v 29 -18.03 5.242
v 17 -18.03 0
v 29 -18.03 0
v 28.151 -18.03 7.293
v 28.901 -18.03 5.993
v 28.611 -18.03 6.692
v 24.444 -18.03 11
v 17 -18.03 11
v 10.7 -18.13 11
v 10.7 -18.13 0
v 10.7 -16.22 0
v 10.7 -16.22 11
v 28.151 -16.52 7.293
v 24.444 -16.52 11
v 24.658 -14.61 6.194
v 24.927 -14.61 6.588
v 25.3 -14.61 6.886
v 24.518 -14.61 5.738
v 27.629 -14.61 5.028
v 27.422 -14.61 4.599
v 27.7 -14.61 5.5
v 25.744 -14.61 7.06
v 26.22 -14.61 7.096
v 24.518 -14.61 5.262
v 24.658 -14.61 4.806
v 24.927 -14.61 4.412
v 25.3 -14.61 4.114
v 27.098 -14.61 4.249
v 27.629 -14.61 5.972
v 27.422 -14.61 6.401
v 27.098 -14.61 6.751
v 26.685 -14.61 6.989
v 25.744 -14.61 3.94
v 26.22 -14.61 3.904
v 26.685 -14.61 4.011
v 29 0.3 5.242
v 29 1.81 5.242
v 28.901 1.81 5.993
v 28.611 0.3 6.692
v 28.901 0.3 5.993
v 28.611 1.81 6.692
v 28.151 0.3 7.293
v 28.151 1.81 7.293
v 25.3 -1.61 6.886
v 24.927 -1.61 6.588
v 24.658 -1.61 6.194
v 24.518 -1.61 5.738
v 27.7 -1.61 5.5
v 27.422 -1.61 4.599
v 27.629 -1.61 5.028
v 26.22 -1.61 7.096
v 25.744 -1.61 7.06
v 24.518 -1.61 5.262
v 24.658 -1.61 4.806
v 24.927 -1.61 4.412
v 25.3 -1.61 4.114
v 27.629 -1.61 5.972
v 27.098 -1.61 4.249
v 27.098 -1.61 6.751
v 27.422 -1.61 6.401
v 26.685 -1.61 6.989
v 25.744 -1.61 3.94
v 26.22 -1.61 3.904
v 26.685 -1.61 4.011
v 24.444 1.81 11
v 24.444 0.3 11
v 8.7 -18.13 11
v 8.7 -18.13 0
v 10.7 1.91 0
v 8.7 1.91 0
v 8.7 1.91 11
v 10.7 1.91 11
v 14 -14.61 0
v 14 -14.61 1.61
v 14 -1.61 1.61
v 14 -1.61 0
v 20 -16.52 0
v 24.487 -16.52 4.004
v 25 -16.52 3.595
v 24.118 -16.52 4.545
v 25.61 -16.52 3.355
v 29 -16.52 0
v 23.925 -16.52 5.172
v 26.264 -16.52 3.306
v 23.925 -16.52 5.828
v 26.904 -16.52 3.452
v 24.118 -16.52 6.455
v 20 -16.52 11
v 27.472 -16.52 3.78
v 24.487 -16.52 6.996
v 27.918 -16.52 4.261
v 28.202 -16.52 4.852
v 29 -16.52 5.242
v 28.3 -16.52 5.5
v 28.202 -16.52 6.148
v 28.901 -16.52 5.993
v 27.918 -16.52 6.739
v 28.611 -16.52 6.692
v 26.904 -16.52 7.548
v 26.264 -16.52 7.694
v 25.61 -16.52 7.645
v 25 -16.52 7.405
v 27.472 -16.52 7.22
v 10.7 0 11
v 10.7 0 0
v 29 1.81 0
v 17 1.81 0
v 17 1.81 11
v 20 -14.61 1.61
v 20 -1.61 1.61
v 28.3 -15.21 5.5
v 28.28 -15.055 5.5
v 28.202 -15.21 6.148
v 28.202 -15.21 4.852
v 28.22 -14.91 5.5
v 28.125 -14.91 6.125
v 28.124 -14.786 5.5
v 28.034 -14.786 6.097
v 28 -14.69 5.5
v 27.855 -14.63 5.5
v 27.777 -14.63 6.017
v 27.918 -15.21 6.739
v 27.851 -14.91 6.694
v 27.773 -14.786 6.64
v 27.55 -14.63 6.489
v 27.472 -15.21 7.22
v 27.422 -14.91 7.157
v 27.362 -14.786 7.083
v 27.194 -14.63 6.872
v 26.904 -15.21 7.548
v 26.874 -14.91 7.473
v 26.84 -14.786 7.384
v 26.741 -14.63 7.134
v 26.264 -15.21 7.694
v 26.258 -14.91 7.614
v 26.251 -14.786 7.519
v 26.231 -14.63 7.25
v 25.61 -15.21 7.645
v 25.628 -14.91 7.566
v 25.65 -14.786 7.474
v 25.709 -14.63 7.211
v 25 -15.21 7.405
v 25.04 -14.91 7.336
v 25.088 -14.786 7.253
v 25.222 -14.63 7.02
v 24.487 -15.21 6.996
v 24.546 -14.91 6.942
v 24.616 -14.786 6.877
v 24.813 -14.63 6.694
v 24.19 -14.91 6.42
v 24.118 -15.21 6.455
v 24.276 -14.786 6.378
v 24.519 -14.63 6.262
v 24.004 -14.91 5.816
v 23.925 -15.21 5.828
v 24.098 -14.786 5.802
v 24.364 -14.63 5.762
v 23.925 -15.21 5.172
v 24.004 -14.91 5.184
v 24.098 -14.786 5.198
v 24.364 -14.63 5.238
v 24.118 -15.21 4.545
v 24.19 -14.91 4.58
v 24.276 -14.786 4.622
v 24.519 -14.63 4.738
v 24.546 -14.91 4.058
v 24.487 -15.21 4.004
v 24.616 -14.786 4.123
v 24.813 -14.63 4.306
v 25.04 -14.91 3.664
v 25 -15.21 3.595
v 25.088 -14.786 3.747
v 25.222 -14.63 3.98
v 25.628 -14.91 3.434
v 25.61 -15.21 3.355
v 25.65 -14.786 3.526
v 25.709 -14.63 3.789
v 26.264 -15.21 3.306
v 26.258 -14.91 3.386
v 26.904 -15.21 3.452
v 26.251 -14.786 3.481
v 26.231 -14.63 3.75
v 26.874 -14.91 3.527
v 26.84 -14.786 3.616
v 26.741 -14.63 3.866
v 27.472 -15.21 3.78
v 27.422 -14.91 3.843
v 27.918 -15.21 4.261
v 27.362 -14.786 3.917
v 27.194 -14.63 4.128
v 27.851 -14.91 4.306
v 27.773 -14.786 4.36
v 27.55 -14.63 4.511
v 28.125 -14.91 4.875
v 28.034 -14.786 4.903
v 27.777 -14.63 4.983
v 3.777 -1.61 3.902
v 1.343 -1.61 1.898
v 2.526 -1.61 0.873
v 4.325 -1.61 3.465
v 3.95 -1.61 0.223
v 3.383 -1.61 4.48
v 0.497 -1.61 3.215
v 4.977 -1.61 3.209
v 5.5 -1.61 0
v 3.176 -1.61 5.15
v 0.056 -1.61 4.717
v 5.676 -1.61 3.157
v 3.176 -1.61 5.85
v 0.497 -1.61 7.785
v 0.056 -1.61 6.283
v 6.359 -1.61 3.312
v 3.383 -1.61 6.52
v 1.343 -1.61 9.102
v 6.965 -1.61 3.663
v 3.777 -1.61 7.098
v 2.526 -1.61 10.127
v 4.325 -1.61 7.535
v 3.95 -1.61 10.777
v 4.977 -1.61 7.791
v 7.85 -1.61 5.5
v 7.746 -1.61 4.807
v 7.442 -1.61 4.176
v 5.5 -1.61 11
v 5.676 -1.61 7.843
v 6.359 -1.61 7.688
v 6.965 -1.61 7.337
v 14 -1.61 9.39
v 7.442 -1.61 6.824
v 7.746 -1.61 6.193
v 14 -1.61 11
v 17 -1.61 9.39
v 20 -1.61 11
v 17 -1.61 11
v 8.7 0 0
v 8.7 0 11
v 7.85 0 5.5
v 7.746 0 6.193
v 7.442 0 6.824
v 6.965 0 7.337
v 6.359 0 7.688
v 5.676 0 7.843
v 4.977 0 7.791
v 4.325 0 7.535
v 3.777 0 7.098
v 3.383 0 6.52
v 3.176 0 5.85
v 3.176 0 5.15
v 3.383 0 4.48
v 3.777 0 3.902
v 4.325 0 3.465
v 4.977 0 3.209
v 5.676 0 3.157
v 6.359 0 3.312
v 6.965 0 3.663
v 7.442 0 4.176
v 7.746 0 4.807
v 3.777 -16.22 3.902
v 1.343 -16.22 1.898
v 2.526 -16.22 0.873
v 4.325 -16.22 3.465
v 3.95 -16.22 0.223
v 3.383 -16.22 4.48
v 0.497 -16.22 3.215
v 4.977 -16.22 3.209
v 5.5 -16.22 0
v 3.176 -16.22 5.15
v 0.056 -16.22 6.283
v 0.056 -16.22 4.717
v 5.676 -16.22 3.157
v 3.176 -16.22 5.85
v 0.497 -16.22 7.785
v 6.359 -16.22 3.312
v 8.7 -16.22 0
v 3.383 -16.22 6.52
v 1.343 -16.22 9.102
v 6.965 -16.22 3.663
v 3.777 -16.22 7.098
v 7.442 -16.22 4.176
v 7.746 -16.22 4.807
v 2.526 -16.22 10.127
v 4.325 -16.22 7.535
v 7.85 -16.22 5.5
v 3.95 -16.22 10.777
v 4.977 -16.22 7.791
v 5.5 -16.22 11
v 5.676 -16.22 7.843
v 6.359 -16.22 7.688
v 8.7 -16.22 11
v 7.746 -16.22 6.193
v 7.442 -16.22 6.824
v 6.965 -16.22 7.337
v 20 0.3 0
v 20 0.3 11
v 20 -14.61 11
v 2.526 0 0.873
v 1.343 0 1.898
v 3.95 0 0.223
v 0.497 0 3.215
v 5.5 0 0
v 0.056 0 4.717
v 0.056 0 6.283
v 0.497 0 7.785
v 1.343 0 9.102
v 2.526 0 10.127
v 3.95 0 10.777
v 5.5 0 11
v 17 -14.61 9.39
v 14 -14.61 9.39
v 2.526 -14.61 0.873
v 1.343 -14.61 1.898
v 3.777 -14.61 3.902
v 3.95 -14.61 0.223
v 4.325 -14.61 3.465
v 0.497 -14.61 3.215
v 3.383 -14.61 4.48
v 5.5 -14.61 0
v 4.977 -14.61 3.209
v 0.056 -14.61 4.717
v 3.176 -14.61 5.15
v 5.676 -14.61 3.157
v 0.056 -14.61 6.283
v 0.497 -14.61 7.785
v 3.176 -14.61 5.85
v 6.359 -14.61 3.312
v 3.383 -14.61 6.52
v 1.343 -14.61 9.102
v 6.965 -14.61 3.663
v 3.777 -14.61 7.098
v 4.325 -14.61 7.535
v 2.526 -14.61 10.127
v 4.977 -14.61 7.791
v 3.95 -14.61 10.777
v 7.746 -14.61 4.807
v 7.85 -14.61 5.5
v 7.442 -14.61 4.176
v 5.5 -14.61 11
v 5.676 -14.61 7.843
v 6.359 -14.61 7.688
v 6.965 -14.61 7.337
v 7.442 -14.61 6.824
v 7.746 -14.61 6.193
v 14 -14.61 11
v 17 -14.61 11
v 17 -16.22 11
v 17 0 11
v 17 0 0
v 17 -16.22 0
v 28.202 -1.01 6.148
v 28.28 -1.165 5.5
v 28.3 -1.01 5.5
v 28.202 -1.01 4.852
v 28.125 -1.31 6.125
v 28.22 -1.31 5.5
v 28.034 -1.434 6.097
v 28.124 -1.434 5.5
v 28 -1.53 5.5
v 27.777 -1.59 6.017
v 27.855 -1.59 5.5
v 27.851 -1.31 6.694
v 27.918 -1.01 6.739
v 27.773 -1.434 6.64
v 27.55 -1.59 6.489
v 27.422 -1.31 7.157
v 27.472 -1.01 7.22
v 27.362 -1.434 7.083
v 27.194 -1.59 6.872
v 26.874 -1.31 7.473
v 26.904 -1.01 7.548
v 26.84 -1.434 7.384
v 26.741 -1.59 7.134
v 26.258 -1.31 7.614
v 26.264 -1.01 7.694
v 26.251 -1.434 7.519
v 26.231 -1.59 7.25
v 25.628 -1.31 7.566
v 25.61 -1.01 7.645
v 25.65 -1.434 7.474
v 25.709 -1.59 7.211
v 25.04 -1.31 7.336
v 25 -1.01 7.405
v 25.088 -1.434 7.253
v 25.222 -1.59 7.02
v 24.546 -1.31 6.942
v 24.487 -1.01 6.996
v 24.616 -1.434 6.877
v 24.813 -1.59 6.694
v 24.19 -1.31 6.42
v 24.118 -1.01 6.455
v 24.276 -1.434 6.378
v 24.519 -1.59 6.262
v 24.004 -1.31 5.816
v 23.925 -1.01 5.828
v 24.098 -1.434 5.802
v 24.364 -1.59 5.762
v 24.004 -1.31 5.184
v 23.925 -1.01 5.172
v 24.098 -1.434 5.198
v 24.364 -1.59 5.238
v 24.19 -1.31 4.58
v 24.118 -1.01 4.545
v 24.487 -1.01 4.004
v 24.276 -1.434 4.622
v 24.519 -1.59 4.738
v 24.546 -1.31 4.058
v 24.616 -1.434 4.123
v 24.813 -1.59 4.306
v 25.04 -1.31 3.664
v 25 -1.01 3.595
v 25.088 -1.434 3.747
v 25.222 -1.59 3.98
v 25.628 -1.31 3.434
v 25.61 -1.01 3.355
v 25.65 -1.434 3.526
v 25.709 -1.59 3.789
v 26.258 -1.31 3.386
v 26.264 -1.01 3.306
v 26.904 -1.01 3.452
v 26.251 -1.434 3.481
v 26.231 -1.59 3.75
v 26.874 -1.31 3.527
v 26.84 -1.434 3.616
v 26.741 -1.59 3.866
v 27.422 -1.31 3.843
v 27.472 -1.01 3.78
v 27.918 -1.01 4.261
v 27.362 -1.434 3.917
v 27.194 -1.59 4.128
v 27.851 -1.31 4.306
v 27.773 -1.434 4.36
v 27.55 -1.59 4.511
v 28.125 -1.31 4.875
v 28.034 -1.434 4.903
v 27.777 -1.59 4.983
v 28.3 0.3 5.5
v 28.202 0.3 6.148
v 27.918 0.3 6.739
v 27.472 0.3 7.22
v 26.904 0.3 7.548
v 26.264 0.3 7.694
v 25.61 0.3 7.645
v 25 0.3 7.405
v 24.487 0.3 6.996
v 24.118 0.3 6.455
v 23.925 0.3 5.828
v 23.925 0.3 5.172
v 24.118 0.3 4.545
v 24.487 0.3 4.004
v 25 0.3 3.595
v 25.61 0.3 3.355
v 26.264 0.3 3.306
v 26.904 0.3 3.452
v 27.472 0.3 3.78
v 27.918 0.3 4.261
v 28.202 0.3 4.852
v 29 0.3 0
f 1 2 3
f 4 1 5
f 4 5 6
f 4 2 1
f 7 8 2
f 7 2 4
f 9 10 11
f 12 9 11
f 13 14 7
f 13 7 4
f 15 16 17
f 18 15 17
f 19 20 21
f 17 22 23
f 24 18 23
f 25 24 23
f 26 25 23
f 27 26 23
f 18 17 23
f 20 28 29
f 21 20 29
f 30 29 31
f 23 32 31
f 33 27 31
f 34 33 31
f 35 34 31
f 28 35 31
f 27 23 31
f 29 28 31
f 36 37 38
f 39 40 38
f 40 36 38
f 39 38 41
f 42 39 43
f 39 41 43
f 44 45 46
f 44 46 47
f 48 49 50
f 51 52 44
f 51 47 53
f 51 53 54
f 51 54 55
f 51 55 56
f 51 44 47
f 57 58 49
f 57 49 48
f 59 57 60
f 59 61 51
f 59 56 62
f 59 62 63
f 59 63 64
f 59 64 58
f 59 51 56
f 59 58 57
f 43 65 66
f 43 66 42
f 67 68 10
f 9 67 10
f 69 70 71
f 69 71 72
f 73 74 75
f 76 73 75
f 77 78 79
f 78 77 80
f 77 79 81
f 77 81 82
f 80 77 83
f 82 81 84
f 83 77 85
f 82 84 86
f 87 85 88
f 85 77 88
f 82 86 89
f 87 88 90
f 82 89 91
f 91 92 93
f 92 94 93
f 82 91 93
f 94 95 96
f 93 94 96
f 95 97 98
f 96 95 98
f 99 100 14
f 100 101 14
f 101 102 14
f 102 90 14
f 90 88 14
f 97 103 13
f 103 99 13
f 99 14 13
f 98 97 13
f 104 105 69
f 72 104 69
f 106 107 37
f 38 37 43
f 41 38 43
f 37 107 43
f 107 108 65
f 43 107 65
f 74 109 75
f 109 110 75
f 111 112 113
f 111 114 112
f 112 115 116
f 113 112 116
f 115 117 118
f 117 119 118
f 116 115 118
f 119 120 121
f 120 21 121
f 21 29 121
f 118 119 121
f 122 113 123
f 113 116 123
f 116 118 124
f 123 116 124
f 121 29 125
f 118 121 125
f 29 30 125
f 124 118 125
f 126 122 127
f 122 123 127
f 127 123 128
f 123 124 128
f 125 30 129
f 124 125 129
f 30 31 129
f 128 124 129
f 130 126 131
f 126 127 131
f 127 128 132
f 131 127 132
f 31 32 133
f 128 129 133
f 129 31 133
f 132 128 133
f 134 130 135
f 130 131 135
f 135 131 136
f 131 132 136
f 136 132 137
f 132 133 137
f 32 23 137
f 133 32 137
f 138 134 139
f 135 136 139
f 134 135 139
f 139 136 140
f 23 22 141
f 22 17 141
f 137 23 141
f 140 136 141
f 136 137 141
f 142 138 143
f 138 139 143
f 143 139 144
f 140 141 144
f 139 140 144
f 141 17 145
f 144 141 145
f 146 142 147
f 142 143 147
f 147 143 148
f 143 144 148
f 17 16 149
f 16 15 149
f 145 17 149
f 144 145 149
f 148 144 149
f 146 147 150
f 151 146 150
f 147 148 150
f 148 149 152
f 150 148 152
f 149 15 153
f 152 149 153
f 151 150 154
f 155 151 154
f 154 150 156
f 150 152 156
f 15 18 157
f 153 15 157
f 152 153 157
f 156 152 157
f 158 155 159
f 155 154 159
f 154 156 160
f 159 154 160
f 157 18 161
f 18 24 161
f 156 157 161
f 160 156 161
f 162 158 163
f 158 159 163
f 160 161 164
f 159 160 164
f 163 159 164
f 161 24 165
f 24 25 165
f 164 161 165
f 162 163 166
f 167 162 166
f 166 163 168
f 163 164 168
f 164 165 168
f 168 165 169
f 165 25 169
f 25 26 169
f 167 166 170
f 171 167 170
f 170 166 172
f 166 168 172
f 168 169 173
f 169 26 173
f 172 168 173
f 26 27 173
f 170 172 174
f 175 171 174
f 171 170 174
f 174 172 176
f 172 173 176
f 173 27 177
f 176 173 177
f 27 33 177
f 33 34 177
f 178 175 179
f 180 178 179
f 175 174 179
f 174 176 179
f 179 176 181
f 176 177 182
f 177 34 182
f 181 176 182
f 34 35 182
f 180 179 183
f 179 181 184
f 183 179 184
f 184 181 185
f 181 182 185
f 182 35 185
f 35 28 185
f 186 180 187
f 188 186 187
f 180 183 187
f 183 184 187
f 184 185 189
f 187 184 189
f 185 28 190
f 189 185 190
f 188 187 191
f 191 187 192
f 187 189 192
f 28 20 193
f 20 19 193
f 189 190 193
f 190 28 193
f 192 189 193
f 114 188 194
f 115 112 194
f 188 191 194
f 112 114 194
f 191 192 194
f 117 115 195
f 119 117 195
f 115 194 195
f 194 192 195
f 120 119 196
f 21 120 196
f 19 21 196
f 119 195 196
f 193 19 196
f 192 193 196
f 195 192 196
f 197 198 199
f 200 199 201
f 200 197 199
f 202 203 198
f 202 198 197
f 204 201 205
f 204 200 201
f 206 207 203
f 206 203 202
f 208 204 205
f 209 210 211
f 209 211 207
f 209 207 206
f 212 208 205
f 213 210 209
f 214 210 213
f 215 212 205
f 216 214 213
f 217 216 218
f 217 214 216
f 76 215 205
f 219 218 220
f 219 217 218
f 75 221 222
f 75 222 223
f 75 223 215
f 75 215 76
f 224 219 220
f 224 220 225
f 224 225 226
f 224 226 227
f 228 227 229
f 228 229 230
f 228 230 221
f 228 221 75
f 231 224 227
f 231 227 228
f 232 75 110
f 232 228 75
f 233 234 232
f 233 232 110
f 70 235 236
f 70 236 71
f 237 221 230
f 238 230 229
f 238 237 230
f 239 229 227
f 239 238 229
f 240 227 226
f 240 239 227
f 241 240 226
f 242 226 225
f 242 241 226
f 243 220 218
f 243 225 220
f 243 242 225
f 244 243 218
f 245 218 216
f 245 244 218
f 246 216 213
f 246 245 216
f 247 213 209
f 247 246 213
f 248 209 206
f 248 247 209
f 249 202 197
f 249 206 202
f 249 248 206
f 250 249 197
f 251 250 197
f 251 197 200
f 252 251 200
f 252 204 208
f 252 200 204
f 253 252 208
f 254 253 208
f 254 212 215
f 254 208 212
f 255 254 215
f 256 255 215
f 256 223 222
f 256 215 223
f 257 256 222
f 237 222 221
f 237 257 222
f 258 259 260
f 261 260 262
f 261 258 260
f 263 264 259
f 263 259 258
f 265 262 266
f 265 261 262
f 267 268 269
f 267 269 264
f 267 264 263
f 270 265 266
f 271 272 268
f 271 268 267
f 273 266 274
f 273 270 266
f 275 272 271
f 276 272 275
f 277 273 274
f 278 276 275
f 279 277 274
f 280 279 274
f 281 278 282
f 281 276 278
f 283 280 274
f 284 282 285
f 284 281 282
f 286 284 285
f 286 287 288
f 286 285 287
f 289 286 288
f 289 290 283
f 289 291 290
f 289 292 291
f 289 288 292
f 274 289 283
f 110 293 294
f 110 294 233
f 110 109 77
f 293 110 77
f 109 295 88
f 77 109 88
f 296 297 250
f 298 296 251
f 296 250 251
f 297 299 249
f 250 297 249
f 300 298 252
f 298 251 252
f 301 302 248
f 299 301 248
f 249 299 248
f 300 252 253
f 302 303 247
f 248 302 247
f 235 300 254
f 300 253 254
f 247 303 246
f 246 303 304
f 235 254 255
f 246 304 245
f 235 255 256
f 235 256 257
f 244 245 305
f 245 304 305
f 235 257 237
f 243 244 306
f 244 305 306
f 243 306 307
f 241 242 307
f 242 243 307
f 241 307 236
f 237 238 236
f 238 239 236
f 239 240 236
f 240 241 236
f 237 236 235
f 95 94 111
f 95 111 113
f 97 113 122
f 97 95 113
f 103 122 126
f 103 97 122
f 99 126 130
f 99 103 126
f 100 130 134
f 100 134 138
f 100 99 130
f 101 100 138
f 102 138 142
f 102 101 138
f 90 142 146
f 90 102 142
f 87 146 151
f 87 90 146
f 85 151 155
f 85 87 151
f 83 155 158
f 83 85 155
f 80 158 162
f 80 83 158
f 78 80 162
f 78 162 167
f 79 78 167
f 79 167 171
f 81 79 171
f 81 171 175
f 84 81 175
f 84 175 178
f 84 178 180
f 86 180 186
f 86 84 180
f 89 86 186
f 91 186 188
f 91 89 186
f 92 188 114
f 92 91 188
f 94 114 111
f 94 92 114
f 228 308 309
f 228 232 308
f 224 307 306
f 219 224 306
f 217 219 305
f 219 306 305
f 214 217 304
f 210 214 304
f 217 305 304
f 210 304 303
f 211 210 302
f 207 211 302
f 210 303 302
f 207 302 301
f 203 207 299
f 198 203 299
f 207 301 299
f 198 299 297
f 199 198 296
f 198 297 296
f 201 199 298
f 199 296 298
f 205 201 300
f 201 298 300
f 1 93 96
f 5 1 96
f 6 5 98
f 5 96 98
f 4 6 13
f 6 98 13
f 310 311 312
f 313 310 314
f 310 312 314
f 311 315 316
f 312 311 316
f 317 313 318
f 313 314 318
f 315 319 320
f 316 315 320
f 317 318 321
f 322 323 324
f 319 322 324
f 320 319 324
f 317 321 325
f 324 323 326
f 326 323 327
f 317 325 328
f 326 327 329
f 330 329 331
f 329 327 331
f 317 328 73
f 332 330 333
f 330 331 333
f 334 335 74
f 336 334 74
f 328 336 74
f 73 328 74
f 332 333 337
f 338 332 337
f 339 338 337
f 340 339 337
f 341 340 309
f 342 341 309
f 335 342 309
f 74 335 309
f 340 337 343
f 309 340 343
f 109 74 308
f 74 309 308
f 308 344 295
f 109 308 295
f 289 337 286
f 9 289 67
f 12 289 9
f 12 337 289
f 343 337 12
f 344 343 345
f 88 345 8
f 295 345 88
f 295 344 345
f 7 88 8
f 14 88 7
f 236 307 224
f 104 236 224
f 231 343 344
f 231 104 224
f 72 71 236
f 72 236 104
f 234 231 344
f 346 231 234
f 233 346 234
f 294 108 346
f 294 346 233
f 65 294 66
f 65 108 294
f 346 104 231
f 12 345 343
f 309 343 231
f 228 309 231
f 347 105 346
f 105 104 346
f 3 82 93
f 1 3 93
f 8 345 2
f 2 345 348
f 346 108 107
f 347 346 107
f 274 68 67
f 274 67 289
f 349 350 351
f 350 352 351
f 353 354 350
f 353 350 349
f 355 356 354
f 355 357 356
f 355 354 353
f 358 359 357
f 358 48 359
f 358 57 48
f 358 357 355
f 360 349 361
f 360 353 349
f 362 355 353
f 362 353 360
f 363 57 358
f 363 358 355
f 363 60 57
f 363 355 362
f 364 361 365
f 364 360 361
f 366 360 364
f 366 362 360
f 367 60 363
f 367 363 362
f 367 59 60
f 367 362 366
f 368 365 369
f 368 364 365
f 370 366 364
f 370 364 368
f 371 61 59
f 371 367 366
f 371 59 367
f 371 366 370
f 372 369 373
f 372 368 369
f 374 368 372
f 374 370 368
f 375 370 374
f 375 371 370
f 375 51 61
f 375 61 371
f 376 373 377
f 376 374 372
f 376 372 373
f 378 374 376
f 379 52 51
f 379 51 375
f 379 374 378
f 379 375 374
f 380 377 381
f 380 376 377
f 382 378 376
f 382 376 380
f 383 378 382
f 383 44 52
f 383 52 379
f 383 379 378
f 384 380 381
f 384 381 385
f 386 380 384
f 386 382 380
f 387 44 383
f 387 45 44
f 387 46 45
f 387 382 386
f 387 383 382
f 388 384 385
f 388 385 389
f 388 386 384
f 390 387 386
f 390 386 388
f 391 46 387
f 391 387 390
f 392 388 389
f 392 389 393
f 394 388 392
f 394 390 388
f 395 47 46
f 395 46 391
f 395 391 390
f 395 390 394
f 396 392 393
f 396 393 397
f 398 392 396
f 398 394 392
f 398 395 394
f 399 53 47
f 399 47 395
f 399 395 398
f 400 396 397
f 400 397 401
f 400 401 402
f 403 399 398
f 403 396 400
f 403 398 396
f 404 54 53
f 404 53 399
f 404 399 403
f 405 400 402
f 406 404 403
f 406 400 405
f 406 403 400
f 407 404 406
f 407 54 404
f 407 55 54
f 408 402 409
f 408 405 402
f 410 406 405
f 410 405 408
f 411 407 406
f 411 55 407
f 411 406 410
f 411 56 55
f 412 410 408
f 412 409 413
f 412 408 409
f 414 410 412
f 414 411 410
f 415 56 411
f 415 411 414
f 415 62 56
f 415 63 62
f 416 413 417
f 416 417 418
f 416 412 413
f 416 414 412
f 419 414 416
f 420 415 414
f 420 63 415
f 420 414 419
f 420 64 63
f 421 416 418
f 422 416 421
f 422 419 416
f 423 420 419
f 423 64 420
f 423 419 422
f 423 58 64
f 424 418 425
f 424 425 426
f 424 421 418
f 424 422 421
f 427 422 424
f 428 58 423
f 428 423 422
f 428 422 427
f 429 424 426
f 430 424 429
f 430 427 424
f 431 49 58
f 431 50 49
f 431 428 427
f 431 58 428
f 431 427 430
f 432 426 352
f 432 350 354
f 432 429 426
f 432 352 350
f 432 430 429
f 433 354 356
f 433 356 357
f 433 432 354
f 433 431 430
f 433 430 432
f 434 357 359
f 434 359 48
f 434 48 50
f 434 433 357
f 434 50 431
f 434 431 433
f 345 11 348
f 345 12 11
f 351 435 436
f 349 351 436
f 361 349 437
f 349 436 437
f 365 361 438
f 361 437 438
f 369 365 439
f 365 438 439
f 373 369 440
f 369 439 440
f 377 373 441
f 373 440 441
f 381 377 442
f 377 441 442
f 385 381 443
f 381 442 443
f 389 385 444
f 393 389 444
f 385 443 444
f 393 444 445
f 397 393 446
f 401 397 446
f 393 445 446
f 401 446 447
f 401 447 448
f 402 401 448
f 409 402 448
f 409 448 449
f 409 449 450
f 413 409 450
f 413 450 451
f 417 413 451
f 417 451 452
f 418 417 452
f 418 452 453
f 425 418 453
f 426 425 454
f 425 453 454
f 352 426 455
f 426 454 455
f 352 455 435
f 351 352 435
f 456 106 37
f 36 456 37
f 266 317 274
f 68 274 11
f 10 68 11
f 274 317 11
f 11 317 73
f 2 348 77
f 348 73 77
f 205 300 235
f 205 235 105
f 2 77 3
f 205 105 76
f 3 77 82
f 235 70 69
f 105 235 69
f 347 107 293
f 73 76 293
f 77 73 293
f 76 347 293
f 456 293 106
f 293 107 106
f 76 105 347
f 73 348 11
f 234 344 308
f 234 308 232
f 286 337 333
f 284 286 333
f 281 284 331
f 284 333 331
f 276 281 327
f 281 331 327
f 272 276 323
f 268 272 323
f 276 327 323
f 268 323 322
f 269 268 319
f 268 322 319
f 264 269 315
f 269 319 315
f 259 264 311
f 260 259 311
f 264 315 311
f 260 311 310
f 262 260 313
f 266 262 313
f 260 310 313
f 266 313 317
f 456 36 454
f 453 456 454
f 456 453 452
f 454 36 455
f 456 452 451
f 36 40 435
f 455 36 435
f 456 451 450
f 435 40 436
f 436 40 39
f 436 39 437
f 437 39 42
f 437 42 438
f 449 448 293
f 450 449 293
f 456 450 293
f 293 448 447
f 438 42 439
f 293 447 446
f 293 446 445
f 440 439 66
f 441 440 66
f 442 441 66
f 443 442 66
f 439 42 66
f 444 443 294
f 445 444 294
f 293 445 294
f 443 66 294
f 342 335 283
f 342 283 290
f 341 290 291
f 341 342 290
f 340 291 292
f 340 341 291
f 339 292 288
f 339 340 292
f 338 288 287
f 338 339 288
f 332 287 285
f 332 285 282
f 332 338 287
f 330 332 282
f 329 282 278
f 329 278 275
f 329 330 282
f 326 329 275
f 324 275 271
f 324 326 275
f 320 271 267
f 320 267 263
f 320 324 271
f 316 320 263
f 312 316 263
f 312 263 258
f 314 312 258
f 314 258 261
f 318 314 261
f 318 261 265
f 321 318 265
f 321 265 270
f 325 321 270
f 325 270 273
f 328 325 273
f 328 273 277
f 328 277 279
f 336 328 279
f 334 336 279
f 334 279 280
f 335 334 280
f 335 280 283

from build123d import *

# Parameters (mm, degrees)
SKETCH_R        = 2.35
PAD_DEPTH       = 16.22
PAD001_DEPTH    = 19.84
SKETCH010_W     = 14
SKETCH010_H     = 13
POCKET_DEPTH    = 1.611
POCKET001_DEPTH = 7.78
SKETCH012_W     = 14
SKETCH012_H     = 13
POCKET002_DEPTH = 1.61
SKETCH013_W     = 2
SKETCH013_H     = 1.91
PAD002_DEPTH    = 11
SKETCH014_R     = 2.2
PAD003_DEPTH    = 1.91
SKETCH015_R     = 2.2
PAD004_DEPTH    = 1.91
FILLET_R        = 0.6


with BuildPart() as part:
    # Sketch → Pad (new body)
    with BuildSketch(Plane.XZ):
        with BuildLine():
            Line((20, 0), (20, 11))
            Line((20, 11), (5.500002, 11))
            ThreePointArc((5.500002, 11), (0, 5.5), (5.500002, 0))
            Line((20, 0), (5.500002, 0))
        make_face()
        with Locations((5.5, 5.5)):
            Circle(SKETCH_R, mode=Mode.SUBTRACT)
    extrude(amount=PAD_DEPTH)

    # Sketch009 → Pad001 (join)
    with BuildSketch(Plane.XZ.offset(-1.81)):
        with BuildLine():
            Line((17, 0), (29, 0))
            Line((29, 0), (29, 5.242431))
            ThreePointArc((29, 5.242431), (28.779251, 6.352213), (28.15061, 7.293041))
            Line((24.443651, 11), (28.15061, 7.293041))
            Line((17, 11), (24.443651, 11))
            Line((17, 11), (17, 0))
        make_face()
    extrude(amount=PAD001_DEPTH)

    # Sketch010 → Pocket (cut, through all)
    with BuildSketch(Plane.XY.offset(1.61)):
        Polygon((20, -1.61), (20, -14.61), (20, -16.52), (29, -16.52), (29, 0.3), (20, 0.3), align=None)
        with Locations((7, -8.11)):
            Rectangle(SKETCH010_W, SKETCH010_H)
    extrude(amount=-POCKET_DEPTH, mode=Mode.SUBTRACT)

    # Sketch011 → Pocket001 (cut)
    with BuildSketch(Plane.XY.offset(9.39)):
        Polygon((0, -14.61), (0, -1.61), (14, -1.61), (20, -1.61), (20, 0.3), (29, 0.3), (29, -16.52), (20, -16.52), (20, -14.61), (14, -14.61), align=None)
    extrude(amount=-POCKET001_DEPTH, mode=Mode.SUBTRACT)

    # Sketch012 → Pocket002 (cut)
    with BuildSketch(Plane.XY.offset(11)):
        with Locations((7, -8.11)):
            Rectangle(SKETCH012_W, SKETCH012_H)
        Polygon((20, 0.3), (29, 0.3), (29, -16.52), (20, -16.52), (20, -14.61), (17, -14.61), (17, -1.61), (20, -1.61), align=None)
    extrude(amount=-POCKET002_DEPTH, mode=Mode.SUBTRACT)

    # Sketch013 → Pad002 (join)
    with BuildSketch(Plane.XY):
        with Locations((9.7, 0.955)):
            Rectangle(SKETCH013_W, SKETCH013_H)
        with Locations((9.7, -17.175)):
            Rectangle(SKETCH013_W, SKETCH013_H)
    extrude(amount=PAD002_DEPTH)

    # Sketch014 → Pad003 (join)
    with BuildSketch(Plane.XZ.offset(-0.3)):
        with Locations((26.1, 5.5)):
            Circle(SKETCH014_R)
    extrude(amount=PAD003_DEPTH)

    # Sketch015 → Pad004 (join)
    with BuildSketch(Plane.XZ.offset(16.52)):
        with Locations((26.1, 5.5)):
            Circle(SKETCH015_R)
    extrude(amount=-PAD004_DEPTH)

    # Fillet
    fillet_edges = [part.edges().sort_by_distance(p)[0] for p in [
        (23.9, -1.61, 5.5),
        (23.9, -14.61, 5.5),
    ]]
    fillet(fillet_edges, radius=FILLET_R)


solid = part.part
